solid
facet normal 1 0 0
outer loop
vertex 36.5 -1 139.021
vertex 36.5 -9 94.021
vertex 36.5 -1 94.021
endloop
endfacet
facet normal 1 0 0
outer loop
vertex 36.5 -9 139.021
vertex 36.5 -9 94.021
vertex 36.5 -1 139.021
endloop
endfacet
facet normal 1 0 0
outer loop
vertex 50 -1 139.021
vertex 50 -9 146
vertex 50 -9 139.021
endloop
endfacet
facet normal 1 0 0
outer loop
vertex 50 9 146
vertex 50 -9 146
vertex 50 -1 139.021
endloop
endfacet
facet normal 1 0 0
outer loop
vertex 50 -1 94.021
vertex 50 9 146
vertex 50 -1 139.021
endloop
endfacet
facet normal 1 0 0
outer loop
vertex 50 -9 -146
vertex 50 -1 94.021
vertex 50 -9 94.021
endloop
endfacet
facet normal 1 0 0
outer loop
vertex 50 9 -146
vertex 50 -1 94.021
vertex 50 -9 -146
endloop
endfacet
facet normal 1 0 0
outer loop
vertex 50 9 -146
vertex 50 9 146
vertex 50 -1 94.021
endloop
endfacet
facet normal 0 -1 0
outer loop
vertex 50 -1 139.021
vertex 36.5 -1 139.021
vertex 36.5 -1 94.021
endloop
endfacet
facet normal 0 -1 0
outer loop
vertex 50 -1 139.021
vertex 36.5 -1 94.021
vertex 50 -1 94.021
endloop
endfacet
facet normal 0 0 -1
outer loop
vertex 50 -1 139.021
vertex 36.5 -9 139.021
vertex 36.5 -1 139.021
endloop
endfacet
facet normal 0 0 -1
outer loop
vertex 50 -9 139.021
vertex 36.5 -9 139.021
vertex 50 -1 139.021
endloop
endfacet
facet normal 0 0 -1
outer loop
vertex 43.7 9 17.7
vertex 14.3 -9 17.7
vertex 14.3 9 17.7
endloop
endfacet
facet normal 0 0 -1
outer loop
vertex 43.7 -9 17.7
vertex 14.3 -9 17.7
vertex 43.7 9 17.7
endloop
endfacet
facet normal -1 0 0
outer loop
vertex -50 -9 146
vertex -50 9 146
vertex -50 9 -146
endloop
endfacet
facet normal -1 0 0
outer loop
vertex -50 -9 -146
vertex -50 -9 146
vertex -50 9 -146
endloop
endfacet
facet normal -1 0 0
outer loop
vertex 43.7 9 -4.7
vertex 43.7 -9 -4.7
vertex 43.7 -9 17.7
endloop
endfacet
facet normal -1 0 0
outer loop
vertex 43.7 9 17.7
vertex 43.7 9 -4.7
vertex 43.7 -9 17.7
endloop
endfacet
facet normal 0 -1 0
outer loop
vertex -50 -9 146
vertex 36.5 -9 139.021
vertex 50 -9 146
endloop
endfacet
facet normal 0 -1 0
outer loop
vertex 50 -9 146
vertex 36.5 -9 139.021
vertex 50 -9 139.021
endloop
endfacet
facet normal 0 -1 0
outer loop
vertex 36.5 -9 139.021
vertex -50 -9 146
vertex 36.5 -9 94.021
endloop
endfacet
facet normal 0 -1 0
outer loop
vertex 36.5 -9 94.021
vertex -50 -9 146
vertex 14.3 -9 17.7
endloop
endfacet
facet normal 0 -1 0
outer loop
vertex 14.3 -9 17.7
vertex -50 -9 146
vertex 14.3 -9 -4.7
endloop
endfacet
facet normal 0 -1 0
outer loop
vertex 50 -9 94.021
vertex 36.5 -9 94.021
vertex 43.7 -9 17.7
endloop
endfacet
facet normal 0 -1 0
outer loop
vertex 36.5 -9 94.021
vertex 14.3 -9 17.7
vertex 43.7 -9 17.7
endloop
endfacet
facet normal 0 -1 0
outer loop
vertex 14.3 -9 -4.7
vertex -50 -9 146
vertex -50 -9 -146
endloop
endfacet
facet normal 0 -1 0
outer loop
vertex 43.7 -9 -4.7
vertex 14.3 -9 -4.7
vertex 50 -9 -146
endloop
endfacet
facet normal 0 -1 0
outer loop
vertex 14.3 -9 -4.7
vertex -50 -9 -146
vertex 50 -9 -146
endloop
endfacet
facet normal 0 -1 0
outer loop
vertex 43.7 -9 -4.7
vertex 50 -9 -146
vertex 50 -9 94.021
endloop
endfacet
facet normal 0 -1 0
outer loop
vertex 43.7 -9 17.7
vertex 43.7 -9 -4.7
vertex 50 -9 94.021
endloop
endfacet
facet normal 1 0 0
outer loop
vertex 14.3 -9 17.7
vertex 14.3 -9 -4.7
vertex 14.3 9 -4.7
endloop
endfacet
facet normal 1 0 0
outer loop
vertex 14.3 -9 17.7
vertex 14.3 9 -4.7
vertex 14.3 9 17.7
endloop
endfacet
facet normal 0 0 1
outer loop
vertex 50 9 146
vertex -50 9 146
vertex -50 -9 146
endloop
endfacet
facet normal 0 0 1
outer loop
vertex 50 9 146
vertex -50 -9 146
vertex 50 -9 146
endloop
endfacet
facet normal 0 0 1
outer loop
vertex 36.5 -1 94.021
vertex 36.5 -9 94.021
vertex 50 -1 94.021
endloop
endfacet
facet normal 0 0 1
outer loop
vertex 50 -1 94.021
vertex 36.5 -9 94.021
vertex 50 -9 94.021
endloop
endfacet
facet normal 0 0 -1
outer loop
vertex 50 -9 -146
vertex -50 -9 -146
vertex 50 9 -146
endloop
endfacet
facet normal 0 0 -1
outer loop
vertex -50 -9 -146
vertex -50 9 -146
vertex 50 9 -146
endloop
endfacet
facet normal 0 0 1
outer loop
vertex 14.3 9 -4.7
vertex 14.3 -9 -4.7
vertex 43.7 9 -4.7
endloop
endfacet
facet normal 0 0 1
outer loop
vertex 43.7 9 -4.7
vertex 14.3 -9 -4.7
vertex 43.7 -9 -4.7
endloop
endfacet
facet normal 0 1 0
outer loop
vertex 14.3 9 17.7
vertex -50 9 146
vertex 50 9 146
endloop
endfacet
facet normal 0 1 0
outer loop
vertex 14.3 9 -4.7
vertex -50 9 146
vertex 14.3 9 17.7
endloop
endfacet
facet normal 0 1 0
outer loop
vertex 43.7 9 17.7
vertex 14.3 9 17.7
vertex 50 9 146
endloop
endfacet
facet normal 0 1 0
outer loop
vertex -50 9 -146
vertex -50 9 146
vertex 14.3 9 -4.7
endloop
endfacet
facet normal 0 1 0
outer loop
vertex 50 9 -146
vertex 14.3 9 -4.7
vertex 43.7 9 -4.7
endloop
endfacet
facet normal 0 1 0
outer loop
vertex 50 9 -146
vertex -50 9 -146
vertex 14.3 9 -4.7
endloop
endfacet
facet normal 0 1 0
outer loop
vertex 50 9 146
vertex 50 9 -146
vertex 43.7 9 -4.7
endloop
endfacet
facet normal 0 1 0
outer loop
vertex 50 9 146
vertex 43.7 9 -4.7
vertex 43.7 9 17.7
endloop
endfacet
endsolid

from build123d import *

# Parameters (mm, degrees)
SKETCH1_W           = 100
SKETCH1_H           = 292
BOSS_EXTRUDE1_DEPTH = 9
SKETCH2_W           = 29.4
SKETCH2_H           = 22.4
CUT_EXTRUDE1_DEPTH  = 19
SKETCH3_W           = 13.5
SKETCH3_H           = 45
CUT_EXTRUDE2_DEPTH  = 8


with BuildPart() as part:
    # Sketch1 → Boss-Extrude1 (new body, symmetric)
    with BuildSketch(Plane(origin=(0, 0, 0), x_dir=(1, 0, 0), z_dir=(0, 1, 0))):
        Rectangle(SKETCH1_W, SKETCH1_H)
    extrude(amount=BOSS_EXTRUDE1_DEPTH, both=True)

    # Sketch2 → Cut-Extrude1 (cut, through all)
    with BuildSketch(Plane.XZ.offset(9)):
        with Locations((29, 6.5)):
            Rectangle(SKETCH2_W, SKETCH2_H)
    extrude(amount=-CUT_EXTRUDE1_DEPTH, mode=Mode.SUBTRACT)

    # Sketch3 → Cut-Extrude2 (cut)
    with BuildSketch(Plane.XZ.offset(9)):
        with Locations((43.25, 116.521105827)):
            Rectangle(SKETCH3_W, SKETCH3_H)
    extrude(amount=-CUT_EXTRUDE2_DEPTH, mode=Mode.SUBTRACT)


solid = part.part
